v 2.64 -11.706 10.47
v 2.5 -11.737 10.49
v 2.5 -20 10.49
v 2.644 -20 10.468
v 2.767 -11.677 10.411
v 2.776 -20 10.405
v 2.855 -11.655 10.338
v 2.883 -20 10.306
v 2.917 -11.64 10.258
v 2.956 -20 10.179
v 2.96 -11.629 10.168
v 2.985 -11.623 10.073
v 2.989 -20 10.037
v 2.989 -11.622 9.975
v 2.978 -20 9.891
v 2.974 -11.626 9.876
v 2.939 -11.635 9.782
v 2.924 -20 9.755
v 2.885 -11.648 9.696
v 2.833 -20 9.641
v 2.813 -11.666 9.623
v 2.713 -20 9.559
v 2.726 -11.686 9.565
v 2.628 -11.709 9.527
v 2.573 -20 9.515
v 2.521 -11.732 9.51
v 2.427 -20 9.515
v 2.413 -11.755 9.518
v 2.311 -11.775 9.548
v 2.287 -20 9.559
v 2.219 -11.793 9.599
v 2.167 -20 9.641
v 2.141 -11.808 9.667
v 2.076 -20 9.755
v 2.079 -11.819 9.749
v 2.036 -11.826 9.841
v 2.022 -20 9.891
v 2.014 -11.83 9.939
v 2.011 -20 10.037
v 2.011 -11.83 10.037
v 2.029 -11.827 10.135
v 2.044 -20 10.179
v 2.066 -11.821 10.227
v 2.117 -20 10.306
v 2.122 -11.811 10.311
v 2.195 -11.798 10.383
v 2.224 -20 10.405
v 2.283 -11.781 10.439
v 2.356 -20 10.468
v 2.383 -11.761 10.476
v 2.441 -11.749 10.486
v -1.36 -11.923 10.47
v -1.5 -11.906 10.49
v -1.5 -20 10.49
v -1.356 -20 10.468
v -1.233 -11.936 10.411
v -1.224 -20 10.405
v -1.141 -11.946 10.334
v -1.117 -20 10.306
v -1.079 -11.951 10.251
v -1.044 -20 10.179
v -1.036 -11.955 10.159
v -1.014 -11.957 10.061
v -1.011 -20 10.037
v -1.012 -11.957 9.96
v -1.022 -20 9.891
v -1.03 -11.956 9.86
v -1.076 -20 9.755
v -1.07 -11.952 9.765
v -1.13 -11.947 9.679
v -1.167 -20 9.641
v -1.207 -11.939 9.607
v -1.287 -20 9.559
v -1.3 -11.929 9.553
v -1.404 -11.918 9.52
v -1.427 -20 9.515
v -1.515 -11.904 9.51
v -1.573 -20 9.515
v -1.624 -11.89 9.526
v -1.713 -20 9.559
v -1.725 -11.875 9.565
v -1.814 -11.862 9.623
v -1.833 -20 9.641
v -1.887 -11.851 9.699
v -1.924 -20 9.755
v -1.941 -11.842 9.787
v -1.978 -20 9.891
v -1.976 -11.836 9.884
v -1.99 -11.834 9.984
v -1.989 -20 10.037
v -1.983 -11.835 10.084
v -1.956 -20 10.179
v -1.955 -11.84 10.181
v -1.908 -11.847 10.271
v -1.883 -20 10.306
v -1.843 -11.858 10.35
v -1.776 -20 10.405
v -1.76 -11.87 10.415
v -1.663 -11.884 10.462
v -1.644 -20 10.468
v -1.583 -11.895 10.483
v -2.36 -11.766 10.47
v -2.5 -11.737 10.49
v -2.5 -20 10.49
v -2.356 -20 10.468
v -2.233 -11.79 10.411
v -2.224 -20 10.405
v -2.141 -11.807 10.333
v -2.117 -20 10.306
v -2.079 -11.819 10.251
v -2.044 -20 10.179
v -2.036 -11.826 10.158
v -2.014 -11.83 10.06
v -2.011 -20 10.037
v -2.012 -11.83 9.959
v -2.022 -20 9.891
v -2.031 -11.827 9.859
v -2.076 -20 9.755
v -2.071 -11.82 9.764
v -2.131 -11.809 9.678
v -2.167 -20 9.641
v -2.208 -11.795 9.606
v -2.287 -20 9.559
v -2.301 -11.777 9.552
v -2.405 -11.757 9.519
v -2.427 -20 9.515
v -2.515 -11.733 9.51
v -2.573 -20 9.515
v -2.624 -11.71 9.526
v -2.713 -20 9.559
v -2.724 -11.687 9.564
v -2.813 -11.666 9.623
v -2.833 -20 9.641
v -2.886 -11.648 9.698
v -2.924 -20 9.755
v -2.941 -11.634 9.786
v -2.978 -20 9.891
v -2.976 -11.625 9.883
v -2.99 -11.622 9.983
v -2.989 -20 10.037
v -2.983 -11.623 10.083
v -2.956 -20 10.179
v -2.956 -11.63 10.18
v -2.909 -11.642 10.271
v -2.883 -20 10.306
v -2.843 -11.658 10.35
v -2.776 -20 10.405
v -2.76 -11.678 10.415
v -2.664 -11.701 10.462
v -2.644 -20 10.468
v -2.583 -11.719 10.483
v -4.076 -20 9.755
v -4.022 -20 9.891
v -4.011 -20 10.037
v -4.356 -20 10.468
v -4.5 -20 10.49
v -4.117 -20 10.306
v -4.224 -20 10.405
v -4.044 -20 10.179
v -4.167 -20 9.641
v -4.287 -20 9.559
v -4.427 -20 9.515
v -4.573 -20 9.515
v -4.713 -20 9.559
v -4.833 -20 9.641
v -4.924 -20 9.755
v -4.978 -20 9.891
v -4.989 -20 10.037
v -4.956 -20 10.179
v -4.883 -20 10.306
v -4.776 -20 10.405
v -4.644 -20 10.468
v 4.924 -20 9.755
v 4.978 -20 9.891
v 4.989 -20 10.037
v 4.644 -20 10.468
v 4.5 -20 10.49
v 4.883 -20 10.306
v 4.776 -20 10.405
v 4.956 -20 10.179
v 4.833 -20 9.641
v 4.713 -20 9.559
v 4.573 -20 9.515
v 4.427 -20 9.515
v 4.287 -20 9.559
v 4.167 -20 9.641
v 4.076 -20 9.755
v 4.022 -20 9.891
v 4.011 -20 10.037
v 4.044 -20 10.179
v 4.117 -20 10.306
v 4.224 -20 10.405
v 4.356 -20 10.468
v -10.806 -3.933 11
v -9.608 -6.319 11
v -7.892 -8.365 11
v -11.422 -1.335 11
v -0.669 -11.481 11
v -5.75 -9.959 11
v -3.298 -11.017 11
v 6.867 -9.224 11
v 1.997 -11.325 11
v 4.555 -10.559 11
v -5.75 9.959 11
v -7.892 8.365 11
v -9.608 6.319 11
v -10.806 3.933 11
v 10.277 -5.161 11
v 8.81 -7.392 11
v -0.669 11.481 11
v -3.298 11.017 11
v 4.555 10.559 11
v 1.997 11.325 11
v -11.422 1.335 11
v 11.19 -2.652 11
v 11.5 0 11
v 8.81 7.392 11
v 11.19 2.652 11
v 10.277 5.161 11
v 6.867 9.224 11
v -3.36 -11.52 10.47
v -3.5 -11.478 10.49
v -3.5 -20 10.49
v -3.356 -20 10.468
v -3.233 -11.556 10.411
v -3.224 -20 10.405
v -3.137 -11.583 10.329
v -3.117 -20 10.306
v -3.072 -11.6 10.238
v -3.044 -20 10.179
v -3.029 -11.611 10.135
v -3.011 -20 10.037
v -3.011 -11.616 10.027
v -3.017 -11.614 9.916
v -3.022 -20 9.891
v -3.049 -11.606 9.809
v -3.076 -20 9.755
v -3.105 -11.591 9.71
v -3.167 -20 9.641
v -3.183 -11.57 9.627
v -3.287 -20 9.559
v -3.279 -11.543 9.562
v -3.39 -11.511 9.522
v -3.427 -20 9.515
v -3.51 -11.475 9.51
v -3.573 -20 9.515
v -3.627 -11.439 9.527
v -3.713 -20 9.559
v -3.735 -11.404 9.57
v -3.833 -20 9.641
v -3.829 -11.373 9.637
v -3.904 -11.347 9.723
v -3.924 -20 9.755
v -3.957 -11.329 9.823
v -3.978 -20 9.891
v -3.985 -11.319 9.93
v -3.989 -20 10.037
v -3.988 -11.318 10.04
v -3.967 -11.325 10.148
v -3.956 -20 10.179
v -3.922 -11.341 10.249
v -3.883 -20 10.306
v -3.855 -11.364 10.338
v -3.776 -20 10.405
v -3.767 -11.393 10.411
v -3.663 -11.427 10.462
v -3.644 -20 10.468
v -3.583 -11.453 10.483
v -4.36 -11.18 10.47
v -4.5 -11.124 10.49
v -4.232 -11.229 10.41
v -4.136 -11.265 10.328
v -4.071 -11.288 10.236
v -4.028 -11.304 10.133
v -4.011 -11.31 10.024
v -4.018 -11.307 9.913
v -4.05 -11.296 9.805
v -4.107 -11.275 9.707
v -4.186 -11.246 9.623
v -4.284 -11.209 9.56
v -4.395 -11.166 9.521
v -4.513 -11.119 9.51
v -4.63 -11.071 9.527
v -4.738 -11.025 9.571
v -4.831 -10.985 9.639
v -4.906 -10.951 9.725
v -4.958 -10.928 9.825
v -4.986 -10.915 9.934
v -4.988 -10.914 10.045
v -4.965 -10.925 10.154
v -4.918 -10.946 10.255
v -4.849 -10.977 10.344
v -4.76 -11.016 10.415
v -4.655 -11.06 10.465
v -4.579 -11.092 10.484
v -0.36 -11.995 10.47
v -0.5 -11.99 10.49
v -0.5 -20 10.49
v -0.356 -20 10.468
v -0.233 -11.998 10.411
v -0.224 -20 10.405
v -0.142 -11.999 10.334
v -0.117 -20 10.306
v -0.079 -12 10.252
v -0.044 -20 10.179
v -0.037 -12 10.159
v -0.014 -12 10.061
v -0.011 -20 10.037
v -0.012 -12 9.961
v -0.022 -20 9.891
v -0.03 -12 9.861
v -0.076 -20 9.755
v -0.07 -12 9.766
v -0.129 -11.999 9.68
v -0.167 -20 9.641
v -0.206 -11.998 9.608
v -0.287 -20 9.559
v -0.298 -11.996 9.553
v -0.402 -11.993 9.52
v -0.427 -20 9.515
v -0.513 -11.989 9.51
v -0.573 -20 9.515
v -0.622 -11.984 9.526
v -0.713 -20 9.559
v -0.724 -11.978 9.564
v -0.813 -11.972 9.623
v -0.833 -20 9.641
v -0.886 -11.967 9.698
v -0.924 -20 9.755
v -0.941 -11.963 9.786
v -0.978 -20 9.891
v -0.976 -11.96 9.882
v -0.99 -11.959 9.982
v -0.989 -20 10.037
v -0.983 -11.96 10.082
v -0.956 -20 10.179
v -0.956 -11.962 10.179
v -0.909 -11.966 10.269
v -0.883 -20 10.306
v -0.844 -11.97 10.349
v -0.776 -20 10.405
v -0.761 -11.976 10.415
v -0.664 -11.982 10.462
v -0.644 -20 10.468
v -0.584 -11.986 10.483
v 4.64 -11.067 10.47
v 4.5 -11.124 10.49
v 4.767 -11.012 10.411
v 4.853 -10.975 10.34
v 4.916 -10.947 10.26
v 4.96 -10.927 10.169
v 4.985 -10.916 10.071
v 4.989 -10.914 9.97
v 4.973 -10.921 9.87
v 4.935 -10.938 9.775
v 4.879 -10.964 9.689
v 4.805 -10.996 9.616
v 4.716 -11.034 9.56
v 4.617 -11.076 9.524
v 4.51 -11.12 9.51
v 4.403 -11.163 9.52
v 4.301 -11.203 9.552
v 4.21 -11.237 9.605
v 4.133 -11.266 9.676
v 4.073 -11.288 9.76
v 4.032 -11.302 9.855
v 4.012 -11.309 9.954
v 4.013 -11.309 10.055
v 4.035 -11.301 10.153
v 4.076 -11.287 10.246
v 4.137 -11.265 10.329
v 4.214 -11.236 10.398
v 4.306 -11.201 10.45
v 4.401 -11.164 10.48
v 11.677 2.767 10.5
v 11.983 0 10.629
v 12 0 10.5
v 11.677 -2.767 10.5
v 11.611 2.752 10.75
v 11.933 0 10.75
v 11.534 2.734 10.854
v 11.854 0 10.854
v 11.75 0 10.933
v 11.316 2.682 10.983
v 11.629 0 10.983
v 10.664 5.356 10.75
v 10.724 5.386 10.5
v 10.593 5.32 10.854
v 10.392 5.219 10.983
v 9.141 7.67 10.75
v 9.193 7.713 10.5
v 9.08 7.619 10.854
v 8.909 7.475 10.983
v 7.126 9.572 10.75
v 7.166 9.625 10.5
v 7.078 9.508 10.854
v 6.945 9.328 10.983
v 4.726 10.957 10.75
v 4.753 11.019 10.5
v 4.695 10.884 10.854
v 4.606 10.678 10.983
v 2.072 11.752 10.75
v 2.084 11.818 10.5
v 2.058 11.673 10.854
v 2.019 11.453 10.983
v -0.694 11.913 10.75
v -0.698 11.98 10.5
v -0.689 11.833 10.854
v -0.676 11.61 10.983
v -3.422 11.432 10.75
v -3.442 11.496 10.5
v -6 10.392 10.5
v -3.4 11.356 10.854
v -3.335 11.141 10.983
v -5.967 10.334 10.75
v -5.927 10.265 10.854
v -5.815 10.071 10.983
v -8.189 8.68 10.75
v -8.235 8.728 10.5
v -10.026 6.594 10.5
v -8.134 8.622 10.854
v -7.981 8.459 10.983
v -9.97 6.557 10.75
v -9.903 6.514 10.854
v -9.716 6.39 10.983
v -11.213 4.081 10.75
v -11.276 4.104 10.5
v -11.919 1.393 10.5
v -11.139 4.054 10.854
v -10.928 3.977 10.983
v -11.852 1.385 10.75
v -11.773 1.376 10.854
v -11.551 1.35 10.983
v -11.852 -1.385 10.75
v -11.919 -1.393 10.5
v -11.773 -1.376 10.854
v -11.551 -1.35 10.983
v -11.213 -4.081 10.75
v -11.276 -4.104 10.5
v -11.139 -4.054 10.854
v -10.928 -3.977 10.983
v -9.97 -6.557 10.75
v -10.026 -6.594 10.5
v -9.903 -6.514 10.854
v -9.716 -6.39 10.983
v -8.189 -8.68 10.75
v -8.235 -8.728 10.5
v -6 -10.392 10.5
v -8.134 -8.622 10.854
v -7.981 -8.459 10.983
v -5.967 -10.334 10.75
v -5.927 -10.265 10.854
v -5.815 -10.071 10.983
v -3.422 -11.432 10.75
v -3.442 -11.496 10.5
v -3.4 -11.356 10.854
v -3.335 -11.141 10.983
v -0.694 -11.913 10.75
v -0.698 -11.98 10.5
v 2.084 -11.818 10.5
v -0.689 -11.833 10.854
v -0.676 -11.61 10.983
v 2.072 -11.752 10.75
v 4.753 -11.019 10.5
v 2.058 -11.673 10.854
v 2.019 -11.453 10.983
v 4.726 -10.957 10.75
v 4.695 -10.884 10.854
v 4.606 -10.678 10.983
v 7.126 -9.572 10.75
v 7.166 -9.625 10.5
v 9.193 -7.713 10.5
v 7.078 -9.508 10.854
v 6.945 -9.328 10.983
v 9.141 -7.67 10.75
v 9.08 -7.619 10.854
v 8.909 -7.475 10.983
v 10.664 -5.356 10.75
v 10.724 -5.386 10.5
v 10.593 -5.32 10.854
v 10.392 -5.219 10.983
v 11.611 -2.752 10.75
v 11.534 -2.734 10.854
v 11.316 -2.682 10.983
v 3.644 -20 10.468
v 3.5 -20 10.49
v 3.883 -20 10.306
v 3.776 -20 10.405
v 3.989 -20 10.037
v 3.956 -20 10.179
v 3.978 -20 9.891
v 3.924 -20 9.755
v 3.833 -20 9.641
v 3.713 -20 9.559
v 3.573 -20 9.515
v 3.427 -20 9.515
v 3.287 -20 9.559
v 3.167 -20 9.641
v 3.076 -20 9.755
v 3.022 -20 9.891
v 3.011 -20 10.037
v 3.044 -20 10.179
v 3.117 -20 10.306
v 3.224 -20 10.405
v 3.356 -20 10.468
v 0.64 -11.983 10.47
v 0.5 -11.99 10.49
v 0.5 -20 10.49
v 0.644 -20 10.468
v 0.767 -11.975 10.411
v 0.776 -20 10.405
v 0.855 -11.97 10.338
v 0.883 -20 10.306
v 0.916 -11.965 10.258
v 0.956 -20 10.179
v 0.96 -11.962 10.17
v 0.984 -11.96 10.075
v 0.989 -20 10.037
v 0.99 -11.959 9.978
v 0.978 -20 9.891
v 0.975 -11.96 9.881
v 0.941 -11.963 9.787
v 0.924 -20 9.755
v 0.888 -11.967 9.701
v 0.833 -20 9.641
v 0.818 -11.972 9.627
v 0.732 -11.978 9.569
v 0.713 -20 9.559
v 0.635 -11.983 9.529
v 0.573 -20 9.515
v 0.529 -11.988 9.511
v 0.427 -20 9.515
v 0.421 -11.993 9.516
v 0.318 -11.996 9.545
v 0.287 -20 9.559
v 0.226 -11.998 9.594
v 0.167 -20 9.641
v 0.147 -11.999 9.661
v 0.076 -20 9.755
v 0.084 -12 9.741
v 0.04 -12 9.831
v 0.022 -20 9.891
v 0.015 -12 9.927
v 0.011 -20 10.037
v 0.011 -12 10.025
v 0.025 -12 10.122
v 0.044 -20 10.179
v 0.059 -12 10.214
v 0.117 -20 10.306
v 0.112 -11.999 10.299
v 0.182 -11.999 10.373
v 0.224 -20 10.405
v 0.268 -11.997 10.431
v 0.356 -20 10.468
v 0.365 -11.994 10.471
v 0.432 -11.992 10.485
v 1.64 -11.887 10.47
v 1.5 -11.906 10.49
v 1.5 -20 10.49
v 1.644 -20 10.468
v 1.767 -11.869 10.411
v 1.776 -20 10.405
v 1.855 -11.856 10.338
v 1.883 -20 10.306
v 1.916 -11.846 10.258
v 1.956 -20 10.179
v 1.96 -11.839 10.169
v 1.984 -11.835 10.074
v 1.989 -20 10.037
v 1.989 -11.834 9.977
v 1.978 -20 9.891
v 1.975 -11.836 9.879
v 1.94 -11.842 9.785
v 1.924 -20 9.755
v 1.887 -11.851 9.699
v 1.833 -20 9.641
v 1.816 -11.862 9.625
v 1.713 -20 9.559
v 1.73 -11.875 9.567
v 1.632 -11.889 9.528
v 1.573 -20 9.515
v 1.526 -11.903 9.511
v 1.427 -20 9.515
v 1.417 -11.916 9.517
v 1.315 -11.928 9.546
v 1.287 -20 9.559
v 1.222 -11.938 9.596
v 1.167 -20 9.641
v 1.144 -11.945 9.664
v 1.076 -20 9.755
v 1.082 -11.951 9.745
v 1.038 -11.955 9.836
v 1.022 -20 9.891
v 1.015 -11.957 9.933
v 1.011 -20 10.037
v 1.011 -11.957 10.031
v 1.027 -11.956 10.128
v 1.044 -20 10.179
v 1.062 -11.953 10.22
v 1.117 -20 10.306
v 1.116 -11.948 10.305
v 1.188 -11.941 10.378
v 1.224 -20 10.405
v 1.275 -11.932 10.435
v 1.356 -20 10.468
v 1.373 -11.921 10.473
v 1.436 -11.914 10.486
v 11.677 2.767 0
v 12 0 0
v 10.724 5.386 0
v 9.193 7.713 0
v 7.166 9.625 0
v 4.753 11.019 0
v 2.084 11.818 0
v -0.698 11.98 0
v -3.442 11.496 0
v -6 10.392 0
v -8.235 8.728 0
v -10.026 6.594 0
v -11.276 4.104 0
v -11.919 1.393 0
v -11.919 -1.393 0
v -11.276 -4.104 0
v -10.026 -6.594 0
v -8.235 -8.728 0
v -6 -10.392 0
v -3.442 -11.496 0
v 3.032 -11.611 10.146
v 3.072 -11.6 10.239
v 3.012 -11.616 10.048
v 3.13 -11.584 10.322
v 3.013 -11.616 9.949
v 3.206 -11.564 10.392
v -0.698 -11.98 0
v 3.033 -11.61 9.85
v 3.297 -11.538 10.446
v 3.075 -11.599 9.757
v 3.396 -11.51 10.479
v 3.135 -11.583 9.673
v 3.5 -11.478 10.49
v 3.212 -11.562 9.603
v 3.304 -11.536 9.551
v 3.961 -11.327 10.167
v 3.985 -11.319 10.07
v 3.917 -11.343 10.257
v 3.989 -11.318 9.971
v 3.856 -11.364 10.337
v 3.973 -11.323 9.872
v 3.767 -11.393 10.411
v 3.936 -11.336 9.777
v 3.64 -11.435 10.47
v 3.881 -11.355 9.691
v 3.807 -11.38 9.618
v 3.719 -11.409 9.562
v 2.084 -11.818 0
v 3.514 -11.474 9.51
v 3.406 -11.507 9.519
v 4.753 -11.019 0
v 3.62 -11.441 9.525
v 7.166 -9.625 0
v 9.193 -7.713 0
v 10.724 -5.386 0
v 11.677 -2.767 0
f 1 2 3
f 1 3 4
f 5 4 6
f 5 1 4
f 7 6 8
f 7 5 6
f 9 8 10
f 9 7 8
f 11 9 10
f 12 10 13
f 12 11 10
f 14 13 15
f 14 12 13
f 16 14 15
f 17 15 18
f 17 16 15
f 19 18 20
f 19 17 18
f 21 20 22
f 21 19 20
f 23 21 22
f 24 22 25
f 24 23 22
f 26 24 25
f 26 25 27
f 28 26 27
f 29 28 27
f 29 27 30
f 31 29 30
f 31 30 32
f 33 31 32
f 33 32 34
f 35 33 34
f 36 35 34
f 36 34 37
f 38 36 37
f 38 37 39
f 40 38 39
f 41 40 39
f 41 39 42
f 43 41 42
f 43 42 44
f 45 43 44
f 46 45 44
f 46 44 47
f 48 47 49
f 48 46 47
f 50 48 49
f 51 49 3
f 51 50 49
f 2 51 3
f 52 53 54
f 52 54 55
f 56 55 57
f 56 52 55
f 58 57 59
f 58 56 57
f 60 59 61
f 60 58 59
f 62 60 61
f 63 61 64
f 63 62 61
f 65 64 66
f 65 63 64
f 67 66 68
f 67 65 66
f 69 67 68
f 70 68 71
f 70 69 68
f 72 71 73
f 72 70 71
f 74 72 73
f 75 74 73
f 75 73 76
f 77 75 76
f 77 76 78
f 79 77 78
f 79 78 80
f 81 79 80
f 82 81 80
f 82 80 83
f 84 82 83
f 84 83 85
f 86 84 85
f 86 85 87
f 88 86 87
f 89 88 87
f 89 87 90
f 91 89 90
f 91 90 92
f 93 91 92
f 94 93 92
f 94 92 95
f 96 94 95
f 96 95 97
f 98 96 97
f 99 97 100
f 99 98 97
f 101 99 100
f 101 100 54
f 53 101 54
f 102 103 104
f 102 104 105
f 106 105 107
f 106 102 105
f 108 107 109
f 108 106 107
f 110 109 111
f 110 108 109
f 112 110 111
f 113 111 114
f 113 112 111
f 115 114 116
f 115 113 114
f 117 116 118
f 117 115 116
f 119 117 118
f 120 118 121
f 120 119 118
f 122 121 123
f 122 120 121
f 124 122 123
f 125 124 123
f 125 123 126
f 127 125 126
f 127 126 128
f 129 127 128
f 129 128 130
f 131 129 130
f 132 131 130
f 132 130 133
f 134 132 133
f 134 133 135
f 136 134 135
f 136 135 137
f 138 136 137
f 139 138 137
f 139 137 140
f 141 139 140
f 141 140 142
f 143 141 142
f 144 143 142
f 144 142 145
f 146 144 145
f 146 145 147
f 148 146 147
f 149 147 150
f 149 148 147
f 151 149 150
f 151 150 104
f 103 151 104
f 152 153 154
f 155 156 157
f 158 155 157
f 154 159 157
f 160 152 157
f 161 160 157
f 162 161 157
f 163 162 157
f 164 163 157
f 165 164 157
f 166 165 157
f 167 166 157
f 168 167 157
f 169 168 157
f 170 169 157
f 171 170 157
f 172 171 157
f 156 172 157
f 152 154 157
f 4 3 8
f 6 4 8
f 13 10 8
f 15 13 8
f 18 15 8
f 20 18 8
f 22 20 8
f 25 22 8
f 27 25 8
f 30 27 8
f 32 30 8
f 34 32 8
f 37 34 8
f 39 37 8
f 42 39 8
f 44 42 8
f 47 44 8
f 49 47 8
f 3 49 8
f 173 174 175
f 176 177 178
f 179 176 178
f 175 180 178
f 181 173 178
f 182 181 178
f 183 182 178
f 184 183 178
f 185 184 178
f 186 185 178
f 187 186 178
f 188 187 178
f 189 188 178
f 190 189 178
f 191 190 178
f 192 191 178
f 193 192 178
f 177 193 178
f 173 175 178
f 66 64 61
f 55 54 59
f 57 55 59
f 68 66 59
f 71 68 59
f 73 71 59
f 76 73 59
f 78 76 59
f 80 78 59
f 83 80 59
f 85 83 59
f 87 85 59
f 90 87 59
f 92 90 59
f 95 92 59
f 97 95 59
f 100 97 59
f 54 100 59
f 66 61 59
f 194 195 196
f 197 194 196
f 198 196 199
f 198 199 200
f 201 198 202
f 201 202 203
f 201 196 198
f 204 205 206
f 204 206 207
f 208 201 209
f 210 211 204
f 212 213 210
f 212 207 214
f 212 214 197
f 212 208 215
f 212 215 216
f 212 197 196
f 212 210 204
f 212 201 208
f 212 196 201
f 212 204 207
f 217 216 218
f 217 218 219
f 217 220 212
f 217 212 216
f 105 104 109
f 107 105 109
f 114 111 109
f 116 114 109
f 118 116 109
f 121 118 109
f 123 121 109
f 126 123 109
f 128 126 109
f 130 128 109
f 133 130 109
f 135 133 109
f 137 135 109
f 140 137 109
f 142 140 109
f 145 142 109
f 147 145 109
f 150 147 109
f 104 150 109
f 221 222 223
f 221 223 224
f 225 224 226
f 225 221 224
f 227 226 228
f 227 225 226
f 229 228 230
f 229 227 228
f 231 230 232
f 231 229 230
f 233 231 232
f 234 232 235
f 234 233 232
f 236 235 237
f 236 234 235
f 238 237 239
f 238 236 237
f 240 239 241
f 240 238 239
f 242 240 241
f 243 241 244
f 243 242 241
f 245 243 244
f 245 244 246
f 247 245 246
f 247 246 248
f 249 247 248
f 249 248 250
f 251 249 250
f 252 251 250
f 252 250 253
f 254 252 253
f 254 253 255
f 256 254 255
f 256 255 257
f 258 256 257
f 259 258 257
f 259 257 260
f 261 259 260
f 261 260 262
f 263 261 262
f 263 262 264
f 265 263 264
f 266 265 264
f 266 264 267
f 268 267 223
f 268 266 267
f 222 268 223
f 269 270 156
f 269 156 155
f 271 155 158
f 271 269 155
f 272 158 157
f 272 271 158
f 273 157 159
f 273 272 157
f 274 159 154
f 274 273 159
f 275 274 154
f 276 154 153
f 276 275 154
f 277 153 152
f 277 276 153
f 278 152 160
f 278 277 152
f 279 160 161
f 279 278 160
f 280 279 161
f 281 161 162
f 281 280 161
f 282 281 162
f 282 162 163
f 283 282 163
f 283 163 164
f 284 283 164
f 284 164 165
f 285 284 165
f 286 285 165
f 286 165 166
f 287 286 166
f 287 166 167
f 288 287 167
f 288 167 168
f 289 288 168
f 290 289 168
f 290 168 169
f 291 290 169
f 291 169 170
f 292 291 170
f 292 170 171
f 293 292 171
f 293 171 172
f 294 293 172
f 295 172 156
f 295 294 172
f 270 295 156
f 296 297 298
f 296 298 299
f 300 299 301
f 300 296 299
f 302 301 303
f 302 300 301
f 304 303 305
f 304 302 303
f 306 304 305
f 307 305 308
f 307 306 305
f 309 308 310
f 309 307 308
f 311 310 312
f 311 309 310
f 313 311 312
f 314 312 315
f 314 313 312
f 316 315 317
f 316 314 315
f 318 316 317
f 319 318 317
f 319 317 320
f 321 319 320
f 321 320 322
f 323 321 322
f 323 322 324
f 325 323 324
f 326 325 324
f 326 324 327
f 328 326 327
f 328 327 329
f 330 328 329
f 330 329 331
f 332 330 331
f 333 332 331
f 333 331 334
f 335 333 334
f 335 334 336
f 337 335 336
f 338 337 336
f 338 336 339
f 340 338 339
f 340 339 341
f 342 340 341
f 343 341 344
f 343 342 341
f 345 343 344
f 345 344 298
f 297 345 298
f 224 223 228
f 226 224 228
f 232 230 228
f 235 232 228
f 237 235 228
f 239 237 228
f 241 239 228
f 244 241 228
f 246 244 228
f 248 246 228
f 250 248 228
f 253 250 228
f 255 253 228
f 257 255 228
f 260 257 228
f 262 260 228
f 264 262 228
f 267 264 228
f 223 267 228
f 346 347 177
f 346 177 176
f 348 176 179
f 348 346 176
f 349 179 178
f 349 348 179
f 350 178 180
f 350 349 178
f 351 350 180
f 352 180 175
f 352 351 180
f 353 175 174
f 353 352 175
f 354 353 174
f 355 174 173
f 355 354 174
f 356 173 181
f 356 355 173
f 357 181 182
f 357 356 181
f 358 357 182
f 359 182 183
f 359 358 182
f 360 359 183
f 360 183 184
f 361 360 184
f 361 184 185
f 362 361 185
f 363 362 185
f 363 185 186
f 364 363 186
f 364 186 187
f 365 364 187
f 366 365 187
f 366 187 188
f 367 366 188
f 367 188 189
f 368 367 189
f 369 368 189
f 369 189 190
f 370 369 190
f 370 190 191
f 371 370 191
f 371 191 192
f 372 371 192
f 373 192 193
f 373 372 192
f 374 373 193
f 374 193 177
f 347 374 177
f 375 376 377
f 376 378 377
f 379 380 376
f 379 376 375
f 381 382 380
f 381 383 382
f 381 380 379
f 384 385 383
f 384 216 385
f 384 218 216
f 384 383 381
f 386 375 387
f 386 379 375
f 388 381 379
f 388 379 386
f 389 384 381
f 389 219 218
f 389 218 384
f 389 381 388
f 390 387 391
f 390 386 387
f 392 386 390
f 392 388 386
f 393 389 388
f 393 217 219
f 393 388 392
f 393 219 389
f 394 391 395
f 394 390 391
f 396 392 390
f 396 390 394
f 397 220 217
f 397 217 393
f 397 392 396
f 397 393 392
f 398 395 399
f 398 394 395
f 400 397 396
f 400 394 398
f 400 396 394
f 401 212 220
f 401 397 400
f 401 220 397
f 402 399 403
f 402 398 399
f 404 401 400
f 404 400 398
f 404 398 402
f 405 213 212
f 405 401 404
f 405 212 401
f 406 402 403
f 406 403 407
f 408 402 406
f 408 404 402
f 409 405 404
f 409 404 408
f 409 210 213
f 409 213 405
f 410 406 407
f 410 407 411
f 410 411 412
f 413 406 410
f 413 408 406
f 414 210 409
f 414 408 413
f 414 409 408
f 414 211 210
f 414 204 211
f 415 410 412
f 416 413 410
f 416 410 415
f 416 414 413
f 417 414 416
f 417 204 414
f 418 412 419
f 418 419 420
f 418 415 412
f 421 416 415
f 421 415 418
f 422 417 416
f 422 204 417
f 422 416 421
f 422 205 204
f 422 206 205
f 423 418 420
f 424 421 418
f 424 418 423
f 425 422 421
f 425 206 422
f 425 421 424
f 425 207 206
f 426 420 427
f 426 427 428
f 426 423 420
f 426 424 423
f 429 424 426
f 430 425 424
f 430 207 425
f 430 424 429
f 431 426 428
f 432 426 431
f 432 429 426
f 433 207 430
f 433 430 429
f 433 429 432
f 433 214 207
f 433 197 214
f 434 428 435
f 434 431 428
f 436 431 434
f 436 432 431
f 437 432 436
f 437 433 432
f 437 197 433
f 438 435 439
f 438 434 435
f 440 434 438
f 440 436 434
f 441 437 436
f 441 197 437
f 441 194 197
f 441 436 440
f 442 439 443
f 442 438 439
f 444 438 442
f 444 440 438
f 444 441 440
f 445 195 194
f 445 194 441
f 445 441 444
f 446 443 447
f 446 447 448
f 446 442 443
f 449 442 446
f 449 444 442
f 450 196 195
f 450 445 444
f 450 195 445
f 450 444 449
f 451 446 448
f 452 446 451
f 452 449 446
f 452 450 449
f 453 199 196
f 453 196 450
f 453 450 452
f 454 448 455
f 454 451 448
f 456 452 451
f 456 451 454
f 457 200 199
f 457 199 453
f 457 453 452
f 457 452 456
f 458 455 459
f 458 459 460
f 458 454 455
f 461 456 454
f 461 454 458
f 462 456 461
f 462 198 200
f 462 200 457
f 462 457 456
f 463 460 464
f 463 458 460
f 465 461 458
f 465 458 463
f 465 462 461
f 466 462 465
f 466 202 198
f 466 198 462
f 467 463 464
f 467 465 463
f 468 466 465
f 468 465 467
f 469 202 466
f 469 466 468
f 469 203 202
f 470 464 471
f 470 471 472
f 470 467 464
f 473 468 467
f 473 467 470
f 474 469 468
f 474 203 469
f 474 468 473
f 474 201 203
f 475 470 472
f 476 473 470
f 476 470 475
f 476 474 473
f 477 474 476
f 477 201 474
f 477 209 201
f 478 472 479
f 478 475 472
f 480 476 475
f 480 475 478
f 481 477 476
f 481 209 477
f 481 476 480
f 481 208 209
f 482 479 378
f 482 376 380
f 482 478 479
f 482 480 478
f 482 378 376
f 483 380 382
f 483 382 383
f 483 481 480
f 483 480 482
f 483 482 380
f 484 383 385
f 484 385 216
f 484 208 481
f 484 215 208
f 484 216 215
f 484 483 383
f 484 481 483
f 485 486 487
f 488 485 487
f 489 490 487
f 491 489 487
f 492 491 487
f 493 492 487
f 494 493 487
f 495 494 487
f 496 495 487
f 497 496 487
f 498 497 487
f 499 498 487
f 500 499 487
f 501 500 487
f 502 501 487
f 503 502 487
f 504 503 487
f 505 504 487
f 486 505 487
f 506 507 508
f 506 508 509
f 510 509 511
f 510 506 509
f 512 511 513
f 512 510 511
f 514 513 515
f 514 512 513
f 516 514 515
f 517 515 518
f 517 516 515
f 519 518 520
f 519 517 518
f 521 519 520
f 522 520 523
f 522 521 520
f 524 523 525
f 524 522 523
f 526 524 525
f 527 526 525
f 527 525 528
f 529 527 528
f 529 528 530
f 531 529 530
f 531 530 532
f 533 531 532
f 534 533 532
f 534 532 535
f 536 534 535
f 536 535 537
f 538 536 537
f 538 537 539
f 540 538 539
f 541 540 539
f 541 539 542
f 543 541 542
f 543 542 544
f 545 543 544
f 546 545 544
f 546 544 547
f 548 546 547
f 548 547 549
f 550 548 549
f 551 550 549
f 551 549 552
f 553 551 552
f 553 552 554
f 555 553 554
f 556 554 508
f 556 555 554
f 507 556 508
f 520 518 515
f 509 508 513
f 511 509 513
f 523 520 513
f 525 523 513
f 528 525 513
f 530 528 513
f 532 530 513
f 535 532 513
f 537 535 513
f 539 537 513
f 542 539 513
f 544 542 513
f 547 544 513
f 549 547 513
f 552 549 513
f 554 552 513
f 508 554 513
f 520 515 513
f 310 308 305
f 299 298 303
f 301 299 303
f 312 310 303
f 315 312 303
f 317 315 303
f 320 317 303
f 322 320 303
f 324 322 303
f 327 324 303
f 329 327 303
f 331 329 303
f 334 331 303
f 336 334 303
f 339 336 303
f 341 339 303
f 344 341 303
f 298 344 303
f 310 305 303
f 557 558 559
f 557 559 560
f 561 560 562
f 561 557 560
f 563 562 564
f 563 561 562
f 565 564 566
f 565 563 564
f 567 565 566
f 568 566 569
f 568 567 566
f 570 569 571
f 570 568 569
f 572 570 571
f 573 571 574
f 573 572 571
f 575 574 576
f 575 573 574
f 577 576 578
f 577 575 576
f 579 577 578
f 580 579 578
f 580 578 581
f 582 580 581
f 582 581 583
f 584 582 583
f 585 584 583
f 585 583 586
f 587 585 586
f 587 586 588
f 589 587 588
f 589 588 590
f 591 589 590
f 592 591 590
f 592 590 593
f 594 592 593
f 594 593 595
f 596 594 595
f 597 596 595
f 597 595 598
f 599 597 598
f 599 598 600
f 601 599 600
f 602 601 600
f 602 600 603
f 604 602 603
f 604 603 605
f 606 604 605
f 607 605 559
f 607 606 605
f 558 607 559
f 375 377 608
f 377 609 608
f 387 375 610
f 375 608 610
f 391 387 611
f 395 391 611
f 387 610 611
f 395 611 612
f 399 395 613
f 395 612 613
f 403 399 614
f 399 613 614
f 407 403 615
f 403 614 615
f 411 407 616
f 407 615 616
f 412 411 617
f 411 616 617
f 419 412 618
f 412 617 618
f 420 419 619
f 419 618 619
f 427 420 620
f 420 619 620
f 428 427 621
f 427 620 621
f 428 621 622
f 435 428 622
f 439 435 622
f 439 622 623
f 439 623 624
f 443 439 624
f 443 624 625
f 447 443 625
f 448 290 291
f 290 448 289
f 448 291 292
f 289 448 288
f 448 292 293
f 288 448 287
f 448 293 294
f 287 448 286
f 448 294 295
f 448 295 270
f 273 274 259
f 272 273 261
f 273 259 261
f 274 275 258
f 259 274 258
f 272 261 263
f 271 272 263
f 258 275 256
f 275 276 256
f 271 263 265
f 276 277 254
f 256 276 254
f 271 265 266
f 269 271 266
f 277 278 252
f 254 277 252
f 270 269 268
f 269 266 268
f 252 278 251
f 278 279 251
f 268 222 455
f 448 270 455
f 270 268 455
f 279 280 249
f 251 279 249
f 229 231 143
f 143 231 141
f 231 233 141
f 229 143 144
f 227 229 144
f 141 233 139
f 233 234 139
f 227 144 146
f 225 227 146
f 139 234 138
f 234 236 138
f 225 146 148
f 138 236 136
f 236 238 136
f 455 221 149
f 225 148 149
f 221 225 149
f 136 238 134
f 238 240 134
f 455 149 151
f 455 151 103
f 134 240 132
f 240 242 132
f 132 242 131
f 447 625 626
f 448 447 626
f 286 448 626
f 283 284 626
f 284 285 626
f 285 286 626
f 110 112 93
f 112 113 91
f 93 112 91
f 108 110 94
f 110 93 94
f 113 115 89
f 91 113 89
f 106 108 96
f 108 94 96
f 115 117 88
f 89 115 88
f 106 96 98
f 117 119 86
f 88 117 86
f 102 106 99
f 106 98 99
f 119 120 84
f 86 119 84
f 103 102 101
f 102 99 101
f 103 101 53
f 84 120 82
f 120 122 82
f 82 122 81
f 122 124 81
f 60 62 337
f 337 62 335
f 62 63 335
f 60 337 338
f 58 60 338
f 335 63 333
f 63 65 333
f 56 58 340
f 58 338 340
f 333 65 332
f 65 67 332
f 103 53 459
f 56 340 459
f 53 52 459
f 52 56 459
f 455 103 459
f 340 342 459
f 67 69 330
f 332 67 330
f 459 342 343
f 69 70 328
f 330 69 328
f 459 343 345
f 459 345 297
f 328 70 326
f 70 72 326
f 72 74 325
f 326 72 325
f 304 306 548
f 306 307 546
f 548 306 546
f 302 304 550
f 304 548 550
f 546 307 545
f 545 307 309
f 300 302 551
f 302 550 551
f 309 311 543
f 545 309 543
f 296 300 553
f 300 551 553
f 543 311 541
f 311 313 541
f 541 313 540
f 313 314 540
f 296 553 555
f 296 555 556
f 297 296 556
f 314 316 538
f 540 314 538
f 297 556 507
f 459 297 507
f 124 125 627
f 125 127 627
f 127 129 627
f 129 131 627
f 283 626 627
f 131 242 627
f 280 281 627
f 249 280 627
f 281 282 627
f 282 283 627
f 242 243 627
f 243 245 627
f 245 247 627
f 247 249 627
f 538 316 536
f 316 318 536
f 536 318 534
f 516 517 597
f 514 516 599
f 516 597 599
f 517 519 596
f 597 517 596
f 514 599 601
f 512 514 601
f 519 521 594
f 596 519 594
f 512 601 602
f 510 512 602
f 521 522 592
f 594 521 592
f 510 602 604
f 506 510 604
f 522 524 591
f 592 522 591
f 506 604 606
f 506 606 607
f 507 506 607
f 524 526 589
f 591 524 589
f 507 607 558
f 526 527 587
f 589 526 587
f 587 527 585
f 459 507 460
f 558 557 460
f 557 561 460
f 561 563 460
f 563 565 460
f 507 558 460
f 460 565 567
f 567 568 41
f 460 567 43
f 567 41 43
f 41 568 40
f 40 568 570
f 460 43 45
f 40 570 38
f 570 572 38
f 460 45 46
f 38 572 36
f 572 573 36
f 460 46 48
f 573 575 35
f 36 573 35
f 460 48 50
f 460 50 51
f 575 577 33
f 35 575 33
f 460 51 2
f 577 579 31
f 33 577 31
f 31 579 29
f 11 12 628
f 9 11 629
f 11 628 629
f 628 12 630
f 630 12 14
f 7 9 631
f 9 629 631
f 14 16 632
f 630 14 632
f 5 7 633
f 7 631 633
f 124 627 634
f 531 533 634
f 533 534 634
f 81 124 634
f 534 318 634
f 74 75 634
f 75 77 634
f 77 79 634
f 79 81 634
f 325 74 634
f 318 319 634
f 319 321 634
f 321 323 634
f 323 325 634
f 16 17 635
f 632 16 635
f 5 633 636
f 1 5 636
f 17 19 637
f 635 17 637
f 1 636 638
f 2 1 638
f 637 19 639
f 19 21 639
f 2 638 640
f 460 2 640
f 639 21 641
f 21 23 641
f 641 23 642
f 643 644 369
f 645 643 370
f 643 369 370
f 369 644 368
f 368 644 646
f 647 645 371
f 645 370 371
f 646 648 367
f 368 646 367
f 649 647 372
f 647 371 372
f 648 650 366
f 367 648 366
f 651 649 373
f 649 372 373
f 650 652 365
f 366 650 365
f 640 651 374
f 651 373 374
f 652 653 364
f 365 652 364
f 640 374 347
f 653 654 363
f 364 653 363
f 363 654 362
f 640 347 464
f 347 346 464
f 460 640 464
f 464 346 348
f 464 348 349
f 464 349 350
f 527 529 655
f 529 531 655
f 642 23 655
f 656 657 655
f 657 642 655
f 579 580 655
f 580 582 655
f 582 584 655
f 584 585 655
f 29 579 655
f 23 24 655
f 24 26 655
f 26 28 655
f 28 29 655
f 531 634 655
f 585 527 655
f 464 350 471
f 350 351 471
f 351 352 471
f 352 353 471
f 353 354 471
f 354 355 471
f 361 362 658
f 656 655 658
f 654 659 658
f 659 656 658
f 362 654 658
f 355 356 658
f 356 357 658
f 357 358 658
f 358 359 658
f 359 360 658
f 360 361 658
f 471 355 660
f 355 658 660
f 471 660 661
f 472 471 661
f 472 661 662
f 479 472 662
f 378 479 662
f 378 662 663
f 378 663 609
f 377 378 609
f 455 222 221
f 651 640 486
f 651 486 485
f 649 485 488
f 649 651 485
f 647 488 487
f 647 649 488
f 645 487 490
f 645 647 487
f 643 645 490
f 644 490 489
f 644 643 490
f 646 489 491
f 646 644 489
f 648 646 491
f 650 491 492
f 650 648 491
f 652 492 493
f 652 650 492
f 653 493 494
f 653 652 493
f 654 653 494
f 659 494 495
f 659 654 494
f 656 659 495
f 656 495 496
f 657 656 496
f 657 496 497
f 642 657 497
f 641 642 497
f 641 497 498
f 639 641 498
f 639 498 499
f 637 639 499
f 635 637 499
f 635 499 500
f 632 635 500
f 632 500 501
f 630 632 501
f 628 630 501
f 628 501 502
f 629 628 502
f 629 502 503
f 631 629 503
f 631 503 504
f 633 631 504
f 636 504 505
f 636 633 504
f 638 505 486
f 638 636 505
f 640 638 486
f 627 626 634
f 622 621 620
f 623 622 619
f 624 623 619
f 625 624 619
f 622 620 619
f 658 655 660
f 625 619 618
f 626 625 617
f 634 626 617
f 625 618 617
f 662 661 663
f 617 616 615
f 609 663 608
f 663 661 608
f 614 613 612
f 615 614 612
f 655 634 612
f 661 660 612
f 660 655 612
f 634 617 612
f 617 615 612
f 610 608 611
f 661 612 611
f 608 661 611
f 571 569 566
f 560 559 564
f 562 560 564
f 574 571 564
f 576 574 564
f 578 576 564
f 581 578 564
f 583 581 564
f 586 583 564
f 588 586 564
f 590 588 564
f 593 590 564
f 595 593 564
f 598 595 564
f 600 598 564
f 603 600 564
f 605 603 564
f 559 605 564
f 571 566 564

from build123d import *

# Parameters (mm, degrees)
ESQUISSE1_R        = 12
BOSS_EXTRU_1_DEPTH = 11
CONG_1_R           = 0.5
ESQUISSE2_R        = 0.49
BOSS_EXTRU_2_DEPTH = 20


with BuildPart() as part:
    # Esquisse1 → Boss.-Extru.1 (new body)
    with BuildSketch(Plane.XY):
        Circle(ESQUISSE1_R)
    extrude(amount=BOSS_EXTRU_1_DEPTH)

    # Congé1
    cong_1_edges = [part.edges().sort_by_distance(p)[0] for p in [
        (-12, 0, 11),
    ]]
    fillet(cong_1_edges, radius=CONG_1_R)

    # Esquisse2 → Boss.-Extru.2 (add)
    with BuildSketch(Plane(origin=(0, 0, 0), x_dir=(1, 0, 0), z_dir=(0, 1, 0))):
        with Locations(Location((0.5, -10, 0), (0, 0, 270))):
            Circle(ESQUISSE2_R)
        with Locations(Location((1.5, -10, 0), (0, 0, 270))):
            Circle(ESQUISSE2_R)
        with Locations(Location((2.5, -10, 0), (0, 0, 270))):
            Circle(ESQUISSE2_R)
        with Locations(Location((3.5, -10, 0), (0, 0, 270))):
            Circle(ESQUISSE2_R)
        with Locations(Location((4.5, -10, 0), (0, 0, 270))):
            Circle(ESQUISSE2_R)
        with Locations(Location((-0.5, -10, 0), (0, 0, 270))):
            Circle(ESQUISSE2_R)
        with Locations(Location((-1.5, -10, 0), (0, 0, 270))):
            Circle(ESQUISSE2_R)
        with Locations(Location((-2.5, -10, 0), (0, 0, 270))):
            Circle(ESQUISSE2_R)
        with Locations(Location((-3.5, -10, 0), (0, 0, 270))):
            Circle(ESQUISSE2_R)
        with Locations(Location((-4.5, -10, 0), (0, 0, 270))):
            Circle(ESQUISSE2_R)
    extrude(amount=-BOSS_EXTRU_2_DEPTH)


solid = part.part
